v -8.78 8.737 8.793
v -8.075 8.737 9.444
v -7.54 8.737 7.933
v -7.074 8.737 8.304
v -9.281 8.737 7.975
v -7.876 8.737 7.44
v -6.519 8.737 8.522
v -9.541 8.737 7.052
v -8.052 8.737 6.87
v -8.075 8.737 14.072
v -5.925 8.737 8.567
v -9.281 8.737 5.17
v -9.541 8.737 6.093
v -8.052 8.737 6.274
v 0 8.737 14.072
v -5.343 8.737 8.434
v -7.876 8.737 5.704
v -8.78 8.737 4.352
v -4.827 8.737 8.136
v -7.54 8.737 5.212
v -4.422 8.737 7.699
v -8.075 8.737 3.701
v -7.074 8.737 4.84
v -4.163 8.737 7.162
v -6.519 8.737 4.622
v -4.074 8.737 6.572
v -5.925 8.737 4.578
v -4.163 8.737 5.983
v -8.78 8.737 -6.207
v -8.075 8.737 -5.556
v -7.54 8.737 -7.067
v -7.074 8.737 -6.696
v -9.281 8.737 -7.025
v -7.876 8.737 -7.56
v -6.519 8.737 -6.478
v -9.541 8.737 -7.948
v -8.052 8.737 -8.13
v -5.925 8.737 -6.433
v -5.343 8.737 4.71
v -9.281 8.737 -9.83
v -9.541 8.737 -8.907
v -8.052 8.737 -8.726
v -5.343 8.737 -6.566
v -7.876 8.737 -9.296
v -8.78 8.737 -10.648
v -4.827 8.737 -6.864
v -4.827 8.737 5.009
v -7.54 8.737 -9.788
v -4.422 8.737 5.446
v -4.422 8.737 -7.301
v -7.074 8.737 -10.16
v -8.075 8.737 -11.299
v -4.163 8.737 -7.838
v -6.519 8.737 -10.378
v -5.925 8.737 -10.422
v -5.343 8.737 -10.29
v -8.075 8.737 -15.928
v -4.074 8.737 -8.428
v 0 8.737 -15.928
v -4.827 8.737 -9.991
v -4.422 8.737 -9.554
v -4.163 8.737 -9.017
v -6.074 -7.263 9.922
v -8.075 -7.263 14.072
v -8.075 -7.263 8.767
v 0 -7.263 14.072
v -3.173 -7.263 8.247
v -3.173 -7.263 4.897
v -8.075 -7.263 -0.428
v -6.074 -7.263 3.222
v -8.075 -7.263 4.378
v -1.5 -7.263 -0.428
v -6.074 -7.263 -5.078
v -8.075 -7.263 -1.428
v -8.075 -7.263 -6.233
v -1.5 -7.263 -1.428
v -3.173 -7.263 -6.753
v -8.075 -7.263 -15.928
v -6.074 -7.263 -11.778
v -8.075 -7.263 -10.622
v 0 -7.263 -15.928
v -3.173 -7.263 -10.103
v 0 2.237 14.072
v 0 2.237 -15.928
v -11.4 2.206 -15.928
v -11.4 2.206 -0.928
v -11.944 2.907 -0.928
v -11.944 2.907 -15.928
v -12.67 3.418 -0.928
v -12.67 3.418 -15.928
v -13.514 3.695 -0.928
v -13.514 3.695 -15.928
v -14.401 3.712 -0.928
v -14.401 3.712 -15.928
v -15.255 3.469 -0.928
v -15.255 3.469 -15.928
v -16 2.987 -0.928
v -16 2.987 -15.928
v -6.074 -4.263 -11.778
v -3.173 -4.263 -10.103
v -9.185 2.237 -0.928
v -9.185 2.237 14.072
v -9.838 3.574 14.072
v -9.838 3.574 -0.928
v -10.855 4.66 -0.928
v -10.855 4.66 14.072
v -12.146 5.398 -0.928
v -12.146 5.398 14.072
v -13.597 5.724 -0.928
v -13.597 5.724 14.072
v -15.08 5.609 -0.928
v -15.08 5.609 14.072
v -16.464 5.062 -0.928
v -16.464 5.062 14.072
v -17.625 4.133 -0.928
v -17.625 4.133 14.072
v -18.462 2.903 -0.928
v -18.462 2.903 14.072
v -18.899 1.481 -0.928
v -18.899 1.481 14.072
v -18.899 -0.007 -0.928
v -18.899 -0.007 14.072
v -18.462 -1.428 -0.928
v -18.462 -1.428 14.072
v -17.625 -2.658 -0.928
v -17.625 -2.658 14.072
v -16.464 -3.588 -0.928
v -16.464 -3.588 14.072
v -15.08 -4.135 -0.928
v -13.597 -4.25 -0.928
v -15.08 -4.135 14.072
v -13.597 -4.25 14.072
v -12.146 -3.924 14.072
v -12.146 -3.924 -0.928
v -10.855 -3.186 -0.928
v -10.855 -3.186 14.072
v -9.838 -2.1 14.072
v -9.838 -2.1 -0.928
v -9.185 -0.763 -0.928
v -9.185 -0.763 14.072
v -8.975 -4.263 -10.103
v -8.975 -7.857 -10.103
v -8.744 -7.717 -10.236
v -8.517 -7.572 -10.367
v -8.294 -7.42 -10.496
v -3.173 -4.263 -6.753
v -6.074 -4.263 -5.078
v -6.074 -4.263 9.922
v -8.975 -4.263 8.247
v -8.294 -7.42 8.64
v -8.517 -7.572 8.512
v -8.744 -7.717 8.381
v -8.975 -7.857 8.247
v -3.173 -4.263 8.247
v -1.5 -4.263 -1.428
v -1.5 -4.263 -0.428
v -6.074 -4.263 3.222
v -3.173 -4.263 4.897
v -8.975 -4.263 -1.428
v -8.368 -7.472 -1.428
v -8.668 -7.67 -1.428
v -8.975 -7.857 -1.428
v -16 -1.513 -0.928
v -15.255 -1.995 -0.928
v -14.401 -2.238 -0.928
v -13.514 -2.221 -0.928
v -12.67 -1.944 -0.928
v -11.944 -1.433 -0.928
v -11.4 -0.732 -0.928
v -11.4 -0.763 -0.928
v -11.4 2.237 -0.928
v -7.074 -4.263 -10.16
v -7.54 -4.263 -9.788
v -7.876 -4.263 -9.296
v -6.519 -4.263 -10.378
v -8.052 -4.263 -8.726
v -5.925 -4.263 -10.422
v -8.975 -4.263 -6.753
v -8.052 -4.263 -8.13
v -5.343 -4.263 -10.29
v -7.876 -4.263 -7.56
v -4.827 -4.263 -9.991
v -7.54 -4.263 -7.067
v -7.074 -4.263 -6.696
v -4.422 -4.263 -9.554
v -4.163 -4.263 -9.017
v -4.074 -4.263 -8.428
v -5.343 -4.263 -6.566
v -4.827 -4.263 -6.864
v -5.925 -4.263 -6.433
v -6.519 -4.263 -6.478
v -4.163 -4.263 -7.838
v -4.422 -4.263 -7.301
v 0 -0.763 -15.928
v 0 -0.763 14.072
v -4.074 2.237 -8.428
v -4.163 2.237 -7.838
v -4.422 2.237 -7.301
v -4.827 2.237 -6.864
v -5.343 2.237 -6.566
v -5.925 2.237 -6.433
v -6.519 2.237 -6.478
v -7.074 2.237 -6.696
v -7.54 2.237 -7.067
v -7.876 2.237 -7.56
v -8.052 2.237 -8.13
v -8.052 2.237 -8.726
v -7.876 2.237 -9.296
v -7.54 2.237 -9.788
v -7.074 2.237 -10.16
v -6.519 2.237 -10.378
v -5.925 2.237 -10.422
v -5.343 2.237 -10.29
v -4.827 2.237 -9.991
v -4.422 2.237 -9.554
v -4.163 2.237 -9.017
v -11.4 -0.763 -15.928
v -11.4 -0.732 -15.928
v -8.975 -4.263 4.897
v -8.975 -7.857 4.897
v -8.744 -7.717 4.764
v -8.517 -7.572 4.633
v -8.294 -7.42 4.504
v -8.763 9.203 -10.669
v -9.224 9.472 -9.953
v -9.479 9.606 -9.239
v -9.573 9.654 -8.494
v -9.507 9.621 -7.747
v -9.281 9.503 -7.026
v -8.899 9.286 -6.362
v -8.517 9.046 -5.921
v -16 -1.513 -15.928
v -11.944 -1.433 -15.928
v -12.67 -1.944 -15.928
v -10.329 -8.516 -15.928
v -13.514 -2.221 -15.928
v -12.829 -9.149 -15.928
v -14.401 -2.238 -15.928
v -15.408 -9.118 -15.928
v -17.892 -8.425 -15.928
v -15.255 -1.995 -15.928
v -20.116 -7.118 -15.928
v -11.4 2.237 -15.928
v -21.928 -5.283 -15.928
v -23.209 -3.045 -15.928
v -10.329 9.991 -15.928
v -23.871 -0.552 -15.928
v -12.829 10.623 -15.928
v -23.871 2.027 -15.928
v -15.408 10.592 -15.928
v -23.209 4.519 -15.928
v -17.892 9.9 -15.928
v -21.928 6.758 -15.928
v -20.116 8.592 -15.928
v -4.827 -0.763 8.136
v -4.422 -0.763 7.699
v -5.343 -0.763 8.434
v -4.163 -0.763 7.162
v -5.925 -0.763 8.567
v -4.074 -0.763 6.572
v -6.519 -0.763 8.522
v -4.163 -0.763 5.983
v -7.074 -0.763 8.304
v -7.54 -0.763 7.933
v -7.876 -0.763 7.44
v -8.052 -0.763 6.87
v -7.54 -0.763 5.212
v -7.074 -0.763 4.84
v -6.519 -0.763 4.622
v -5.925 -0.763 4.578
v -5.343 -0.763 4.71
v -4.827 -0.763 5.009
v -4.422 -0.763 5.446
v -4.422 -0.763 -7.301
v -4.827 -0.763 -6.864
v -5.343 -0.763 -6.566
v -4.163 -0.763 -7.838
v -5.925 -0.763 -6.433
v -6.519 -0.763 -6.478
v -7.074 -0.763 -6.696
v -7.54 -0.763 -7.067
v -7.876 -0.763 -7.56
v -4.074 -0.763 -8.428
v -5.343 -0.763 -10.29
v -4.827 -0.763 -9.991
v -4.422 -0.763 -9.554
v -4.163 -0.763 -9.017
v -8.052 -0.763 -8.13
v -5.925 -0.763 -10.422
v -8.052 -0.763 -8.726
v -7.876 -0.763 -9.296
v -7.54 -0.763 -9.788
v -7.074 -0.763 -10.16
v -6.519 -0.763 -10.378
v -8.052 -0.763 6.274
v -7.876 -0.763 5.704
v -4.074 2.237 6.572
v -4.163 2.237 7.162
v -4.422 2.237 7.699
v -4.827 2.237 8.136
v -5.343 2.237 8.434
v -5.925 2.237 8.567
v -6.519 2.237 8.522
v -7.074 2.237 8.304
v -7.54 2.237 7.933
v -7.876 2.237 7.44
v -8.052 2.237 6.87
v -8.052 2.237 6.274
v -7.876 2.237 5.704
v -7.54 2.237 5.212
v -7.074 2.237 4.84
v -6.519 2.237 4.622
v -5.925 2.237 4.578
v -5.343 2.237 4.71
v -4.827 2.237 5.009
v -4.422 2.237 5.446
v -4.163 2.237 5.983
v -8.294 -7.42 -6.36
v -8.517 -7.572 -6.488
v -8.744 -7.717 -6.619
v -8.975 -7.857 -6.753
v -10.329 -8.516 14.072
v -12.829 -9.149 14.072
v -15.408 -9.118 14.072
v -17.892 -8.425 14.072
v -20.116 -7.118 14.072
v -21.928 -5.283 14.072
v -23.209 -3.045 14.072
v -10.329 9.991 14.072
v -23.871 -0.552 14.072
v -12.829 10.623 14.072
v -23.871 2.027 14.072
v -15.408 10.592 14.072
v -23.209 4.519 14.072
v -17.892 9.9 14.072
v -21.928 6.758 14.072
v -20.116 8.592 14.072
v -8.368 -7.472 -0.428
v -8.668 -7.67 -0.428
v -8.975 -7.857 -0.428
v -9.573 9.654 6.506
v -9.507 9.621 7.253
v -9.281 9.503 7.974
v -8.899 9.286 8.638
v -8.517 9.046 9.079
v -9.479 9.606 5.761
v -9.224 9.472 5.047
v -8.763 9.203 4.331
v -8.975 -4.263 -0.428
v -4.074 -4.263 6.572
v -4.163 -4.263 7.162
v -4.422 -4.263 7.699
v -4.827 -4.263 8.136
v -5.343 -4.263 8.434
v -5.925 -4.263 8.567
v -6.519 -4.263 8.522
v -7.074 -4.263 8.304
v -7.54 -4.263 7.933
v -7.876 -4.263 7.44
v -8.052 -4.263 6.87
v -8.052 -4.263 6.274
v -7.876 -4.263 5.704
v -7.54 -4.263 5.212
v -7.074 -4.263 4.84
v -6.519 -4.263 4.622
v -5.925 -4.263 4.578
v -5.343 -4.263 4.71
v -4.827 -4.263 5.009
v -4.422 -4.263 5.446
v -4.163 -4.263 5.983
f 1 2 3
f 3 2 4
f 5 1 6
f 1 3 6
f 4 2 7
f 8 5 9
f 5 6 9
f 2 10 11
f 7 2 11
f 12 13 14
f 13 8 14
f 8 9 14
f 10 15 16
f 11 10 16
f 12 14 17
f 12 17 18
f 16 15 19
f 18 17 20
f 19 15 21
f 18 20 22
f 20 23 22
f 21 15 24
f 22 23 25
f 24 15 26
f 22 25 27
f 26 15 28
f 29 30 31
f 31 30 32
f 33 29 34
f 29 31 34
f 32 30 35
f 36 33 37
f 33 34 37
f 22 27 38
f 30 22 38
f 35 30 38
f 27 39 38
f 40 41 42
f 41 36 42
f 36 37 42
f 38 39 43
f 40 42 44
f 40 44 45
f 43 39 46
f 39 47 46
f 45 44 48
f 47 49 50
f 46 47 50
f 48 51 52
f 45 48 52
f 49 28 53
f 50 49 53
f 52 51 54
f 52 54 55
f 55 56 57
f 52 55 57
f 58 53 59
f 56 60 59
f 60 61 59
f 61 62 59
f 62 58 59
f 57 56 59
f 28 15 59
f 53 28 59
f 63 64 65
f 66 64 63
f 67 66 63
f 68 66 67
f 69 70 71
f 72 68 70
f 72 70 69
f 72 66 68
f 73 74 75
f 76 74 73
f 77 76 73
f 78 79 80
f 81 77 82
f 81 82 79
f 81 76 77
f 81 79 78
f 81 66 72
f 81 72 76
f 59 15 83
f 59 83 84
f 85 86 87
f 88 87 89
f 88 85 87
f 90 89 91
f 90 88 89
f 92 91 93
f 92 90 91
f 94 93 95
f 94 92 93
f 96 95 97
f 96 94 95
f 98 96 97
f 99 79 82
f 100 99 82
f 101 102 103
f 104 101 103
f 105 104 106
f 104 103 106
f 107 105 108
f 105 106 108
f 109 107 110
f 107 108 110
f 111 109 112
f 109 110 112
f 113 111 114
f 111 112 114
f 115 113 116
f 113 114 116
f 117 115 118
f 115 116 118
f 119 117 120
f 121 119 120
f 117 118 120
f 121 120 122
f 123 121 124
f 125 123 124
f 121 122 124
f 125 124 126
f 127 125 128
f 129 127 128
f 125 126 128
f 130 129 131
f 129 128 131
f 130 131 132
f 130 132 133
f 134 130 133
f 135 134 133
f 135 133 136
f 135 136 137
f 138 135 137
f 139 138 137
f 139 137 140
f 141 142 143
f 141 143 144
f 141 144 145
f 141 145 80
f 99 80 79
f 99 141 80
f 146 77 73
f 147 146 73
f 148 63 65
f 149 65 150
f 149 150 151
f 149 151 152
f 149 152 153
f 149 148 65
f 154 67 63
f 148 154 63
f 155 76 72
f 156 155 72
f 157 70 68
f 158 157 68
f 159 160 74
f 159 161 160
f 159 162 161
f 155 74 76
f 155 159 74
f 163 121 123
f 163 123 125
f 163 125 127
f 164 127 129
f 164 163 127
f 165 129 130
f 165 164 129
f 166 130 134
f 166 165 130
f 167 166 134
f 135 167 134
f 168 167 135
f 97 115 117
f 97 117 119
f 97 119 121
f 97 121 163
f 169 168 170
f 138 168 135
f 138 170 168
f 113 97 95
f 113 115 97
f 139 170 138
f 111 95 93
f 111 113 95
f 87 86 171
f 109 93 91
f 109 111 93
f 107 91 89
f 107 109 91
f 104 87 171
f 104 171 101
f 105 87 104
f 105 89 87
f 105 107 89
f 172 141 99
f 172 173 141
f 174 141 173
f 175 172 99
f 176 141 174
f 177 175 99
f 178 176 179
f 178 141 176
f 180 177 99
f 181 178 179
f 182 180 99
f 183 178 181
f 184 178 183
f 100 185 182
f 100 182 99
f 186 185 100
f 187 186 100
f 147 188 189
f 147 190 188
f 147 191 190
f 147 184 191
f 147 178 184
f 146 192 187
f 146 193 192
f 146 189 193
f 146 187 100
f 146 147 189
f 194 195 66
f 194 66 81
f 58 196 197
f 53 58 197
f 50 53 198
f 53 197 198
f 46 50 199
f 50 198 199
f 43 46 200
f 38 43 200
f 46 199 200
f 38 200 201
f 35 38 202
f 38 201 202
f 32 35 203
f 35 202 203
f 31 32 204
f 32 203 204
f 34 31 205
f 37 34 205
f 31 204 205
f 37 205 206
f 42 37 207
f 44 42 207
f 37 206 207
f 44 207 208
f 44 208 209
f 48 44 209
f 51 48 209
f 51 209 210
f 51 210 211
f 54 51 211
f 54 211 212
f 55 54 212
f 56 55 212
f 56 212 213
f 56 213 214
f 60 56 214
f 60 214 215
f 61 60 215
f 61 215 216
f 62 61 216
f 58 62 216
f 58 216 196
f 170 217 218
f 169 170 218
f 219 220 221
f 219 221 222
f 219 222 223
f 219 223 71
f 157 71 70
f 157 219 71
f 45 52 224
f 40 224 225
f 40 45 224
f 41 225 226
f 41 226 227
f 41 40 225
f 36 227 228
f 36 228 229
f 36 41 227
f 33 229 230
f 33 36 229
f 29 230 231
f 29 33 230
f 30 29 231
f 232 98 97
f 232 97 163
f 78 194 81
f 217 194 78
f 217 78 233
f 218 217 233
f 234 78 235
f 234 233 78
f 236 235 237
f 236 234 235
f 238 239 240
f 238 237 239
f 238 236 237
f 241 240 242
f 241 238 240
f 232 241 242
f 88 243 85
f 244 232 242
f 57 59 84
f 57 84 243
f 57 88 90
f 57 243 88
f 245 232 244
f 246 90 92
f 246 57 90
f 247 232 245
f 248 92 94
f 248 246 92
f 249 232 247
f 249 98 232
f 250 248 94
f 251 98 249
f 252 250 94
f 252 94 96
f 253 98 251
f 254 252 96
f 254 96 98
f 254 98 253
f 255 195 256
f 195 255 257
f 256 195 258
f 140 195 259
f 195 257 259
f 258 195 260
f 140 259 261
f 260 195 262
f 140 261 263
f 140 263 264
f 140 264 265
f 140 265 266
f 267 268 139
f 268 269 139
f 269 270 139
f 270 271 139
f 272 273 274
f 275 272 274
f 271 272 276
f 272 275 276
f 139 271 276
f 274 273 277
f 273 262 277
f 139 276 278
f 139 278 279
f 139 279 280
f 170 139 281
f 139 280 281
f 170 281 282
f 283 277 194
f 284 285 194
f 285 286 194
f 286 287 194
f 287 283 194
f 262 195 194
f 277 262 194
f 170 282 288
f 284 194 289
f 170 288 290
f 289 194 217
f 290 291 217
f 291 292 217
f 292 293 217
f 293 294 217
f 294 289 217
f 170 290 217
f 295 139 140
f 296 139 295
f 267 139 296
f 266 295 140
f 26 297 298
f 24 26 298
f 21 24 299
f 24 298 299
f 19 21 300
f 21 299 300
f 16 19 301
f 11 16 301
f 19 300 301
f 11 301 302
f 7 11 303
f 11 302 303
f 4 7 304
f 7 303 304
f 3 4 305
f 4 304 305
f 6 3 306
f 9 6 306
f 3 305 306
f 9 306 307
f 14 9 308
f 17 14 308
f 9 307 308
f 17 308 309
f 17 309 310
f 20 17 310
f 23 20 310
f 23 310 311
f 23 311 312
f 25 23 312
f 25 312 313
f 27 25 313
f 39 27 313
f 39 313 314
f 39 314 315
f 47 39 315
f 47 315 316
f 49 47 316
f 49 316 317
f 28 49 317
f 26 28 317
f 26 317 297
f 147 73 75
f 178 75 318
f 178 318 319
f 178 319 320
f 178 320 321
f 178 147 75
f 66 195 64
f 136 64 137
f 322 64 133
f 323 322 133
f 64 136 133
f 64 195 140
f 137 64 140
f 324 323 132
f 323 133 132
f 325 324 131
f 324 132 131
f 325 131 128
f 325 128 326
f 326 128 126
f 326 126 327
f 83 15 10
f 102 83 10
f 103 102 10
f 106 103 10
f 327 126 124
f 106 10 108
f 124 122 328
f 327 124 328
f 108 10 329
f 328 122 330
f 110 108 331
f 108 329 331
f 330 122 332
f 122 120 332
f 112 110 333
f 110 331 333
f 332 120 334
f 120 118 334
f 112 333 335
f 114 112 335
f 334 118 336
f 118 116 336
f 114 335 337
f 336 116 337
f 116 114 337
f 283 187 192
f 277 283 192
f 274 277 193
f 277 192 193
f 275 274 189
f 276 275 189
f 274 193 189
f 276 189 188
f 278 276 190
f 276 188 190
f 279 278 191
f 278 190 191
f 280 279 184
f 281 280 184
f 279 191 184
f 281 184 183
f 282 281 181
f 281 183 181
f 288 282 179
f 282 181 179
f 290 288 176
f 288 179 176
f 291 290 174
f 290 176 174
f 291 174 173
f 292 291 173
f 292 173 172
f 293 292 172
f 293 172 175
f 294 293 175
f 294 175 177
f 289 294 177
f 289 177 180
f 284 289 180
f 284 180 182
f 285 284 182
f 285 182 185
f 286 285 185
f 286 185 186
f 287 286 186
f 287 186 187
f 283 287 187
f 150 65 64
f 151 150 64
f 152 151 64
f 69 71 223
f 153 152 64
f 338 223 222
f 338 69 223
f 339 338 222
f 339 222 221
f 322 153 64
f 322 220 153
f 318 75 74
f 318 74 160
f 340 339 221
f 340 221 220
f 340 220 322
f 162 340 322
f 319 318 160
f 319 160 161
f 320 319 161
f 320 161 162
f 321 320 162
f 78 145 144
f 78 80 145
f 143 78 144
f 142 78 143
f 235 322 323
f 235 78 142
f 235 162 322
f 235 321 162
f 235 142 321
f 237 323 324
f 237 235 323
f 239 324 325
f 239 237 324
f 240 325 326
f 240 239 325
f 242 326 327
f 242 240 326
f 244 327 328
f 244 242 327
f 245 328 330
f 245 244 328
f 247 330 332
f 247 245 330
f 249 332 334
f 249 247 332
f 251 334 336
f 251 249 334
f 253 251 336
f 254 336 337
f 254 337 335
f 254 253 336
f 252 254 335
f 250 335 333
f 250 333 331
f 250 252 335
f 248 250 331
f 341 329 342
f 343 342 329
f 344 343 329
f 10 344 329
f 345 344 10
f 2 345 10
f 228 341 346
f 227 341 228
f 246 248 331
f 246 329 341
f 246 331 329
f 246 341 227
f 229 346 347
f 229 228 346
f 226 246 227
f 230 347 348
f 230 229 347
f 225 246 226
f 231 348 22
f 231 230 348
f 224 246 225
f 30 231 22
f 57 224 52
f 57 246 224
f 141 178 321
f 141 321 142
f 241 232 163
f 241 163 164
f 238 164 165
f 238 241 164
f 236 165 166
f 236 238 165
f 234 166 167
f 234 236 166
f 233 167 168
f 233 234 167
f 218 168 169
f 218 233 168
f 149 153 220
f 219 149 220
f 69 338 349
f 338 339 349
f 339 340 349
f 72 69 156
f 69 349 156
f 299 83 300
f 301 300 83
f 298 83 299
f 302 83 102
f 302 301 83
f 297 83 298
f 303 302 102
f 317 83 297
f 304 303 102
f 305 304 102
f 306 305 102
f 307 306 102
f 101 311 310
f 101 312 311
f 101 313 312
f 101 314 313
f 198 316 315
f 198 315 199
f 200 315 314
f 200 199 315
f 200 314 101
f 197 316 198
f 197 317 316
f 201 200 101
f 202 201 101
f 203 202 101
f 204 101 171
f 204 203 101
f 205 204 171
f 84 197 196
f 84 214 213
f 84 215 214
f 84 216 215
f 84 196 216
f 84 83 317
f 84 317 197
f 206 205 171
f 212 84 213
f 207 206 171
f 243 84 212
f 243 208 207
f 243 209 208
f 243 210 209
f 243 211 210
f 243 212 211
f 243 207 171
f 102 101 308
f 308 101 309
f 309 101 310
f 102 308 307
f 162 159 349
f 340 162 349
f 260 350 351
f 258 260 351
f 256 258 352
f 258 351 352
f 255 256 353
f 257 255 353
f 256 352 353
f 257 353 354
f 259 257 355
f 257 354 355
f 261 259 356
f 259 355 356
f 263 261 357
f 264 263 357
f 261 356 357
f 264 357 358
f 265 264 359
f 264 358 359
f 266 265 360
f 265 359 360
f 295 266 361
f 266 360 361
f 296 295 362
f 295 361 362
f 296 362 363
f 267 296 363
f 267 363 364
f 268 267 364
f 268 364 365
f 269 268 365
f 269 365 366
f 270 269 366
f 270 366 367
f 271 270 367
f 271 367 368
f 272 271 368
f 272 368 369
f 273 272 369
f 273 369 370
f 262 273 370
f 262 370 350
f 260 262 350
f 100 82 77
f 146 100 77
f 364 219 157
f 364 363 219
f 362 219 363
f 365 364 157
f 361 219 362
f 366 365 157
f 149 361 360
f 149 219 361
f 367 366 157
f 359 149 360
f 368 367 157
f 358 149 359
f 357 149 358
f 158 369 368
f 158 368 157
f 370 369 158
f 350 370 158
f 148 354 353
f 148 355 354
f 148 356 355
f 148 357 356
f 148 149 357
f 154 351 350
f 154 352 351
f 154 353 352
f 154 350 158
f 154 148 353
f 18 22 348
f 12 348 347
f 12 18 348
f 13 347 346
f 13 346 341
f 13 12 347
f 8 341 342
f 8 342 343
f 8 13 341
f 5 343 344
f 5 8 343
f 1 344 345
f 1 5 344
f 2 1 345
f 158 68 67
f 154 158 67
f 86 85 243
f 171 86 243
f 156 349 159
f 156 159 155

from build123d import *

# Parameters (mm, degrees)
SKETCH1_W               = 30
SKETCH1_H               = 16
BOSS_EXTRUDE1_DEPTH     = 14
SKETCH3_R               = 9.955
BOSS_EXTRUDE2_DEPTH     = 30
SKETCH4_W               = 11.4
SKETCH4_H               = 3
CUT_EXTRUDE1_DEPTH      = 30
SKETCH5_R               = 5
CUT_EXTRUDE2_DEPTH      = 15
CUT_EXTRUDE5_DEPTH      = 15
CUT_EXTRUDE7_DEPTH      = 1
CUT_EXTRUDE7_DEPTH_BACK = 3
SKETCH7_R               = 2
SKETCH7_W               = 7.475303805
SKETCH7_H               = 1
SKETCH7_4_R             = 2
CUT_EXTRUDE9_DEPTH      = 34.910470056
SKETCH11_R              = 3.5
CUT_EXTRUDE10_DEPTH     = 0.93


with BuildPart() as part:
    # Sketch1 → Boss-Extrude1 (new body)
    with BuildSketch(Plane(origin=(0, 0, 0), x_dir=(0, 0, -1), z_dir=(1, 0, 0))):
        with Locations((0.927835052, 0.737113402)):
            Rectangle(SKETCH1_W, SKETCH1_H)
    extrude(amount=-BOSS_EXTRUDE1_DEPTH)

    # Sketch3 → Boss-Extrude2 (add)
    with BuildSketch(Plane(origin=(0, 0, -15.927835052), x_dir=(-1, 0, 0), z_dir=(0, 0, -1))):
        with Locations((14, 0.737113402)):
            Circle(SKETCH3_R)
    extrude(amount=-BOSS_EXTRUDE2_DEPTH)

    # Sketch4 → Cut-Extrude1 (cut)
    with BuildSketch(Plane(origin=(0, 0, -15.927835052), x_dir=(-1, 0, 0), z_dir=(0, 0, -1))):
        with Locations((5.7, 0.737113402)):
            Rectangle(SKETCH4_W, SKETCH4_H)
    extrude(amount=-CUT_EXTRUDE1_DEPTH, mode=Mode.SUBTRACT)

    # Sketch5 → Cut-Extrude2 (cut)
    with BuildSketch(Plane.XY.offset(14.072164948)):
        with Locations((-13.955, 0.737113402)):
            Circle(SKETCH5_R)
    extrude(amount=-CUT_EXTRUDE2_DEPTH, mode=Mode.SUBTRACT)

    # Sketch6 → Cut-Extrude5 (cut)
    with BuildSketch(Plane(origin=(0, 0, -15.927835052), x_dir=(-1, 0, 0), z_dir=(0, 0, -1))):
        with BuildLine():
            Line((16, 2.987113402), (16, -1.512886598))
            ThreePointArc((16, -1.512886598), (11.015686517, 0.737113402), (16, 2.987113402))
        make_face()
    extrude(amount=-CUT_EXTRUDE5_DEPTH, mode=Mode.SUBTRACT)

    # Sketch7 → Cut-Extrude7 (cut, two sides: drawn at the far end of the back side and taken through both)
    # profile 1 of 3: a face of its own
    with BuildSketch(Plane.XZ.offset(7.262886598).offset(-CUT_EXTRUDE7_DEPTH_BACK)):
        Polygon((-6.074118703, 3.222164948), (-3.1729336, 4.897164948), (-3.1729336, 8.247164948), (-6.074118703, 9.922164948), (-8.975303805, 8.247164948), (-8.975303805, 4.897164948), align=None)
        with Locations((-6.074118703, 6.572164948)):
            Circle(SKETCH7_R, mode=Mode.SUBTRACT)
    # profile 2 of 3: a face of its own
    with BuildSketch(Plane.XZ.offset(7.262886598).offset(-CUT_EXTRUDE7_DEPTH_BACK)):
        Polygon((-6.074118703, -5.077835052), (-8.975303805, -6.752835052), (-8.975303805, -10.102835052), (-6.074118703, -11.777835052), (-3.1729336, -10.102835052), (-3.1729336, -6.752835052), align=None)
    # profile 3 of 3: a face of its own
    with BuildSketch(Plane.XZ.offset(7.262886598).offset(-CUT_EXTRUDE7_DEPTH_BACK)):
        with Locations((-5.237651903, -0.927835052)):
            Rectangle(SKETCH7_W, SKETCH7_H)
    extrude(amount=CUT_EXTRUDE7_DEPTH + CUT_EXTRUDE7_DEPTH_BACK, mode=Mode.SUBTRACT)

    # Sketch7<4> → Cut-Extrude9 (cut, through all)
    with BuildSketch(Plane.XZ.offset(7.262886598)):
        with Locations((-6.074118703, -8.427835052)):
            Circle(SKETCH7_4_R)
        with Locations((-6.074118703, 6.572164948)):
            Circle(SKETCH7_4_R)
    extrude(amount=-CUT_EXTRUDE9_DEPTH, mode=Mode.SUBTRACT)

    # Sketch11 → Cut-Extrude10 (cut)
    with BuildSketch(Plane(origin=(0, 8.737113402, 0), x_dir=(1, 0, 0), z_dir=(0, 1, 0))):
        with Locations((-6.074118703, -6.572164948)):
            Circle(SKETCH11_R)
        with Locations((-6.074118703, 8.427835052)):
            Circle(SKETCH11_R)
    extrude(amount=CUT_EXTRUDE10_DEPTH, mode=Mode.SUBTRACT)


solid = part.part
